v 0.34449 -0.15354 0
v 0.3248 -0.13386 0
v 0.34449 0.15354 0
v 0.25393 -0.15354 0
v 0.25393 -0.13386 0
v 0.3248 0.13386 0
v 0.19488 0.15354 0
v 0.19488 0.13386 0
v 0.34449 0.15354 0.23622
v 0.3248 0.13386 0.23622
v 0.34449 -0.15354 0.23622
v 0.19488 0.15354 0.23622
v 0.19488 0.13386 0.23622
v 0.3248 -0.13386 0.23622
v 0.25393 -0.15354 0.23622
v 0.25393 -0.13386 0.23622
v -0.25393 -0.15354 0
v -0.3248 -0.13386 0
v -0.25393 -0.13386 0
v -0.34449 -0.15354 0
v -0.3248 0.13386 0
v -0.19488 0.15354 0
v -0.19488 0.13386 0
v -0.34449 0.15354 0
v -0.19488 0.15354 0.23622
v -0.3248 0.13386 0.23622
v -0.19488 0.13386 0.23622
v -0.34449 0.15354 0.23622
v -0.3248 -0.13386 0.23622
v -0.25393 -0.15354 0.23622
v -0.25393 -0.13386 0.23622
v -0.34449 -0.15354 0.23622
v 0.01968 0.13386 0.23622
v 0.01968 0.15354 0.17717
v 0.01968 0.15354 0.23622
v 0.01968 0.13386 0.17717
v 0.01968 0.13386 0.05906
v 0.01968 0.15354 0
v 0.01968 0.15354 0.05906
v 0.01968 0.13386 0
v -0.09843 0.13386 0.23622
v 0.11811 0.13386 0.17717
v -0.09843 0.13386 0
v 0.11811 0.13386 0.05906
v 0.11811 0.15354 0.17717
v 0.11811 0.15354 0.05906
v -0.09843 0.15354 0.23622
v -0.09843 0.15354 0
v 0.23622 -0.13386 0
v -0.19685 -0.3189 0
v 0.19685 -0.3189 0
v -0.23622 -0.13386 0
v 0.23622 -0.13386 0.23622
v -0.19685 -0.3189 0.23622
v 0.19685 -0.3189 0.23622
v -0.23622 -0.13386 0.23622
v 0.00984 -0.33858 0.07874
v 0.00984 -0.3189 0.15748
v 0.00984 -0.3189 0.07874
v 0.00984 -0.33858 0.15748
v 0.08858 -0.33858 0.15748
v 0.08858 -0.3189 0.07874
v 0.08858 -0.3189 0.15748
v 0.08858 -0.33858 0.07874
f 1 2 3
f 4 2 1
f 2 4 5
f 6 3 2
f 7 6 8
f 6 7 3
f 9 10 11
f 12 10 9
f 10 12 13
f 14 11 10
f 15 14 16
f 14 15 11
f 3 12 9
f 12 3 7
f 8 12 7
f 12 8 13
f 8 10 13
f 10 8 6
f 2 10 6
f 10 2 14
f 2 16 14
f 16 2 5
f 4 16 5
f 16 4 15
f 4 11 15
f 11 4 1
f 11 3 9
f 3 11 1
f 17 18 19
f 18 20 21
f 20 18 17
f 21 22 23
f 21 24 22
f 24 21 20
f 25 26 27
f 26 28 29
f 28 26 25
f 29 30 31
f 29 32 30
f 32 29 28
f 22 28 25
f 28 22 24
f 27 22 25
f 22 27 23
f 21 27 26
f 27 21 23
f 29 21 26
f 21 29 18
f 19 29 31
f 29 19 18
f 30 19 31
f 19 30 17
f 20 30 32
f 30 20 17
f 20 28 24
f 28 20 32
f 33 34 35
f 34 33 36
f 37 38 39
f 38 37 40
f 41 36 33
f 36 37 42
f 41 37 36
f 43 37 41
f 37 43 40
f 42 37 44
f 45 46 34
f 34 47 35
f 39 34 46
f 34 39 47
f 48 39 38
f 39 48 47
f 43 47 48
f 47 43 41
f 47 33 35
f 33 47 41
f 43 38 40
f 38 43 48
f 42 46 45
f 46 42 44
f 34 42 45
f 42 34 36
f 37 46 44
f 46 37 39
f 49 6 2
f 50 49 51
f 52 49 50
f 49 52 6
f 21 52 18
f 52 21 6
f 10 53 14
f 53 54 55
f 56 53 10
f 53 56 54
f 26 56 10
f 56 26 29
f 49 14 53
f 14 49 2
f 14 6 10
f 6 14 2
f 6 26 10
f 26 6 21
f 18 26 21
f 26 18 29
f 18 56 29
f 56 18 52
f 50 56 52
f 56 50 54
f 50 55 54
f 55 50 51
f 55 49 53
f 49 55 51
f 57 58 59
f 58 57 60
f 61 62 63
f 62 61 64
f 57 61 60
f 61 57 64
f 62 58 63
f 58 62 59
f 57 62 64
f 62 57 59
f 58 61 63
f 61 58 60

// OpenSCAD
// file: defines.scad
Wb = 1.65;
Hb = 0.68;
H =  1.15;
Wf = 1.20;
Fo = 0.10;

scale = 1/2.54;
// file: LED_LTST-S270TBKT-emitter.scad
include <defines.scad>

Eh = 0.05;

// Label
scale(scale) color("Blue") translate([0, Hb/2 - H - Eh/2, 0.6/2]) rotate([90,0,0]){

  translate([1.65/2 - 0.70, 0, 0]) cube([0.2, 0.2, Eh], center=true);
}
// file: LED_LTST-S270TBKT-label.scad
include <defines.scad>

Lh = 0.05;

// Label
scale(scale) color("Green") translate([0, Hb/2 + Lh/2, 0.6/2]) rotate([90,0,0]){

  translate([-0.1, 0, 0]) cube([0.3, 0.6, Lh], center=true);
  translate([ 0.1, 0, 0]) cube([0.4, 0.3, Lh], center=true);
}
// file: LED_LTST-S270TBKT-body.scad
include <defines.scad>


scale(scale) color([0.8, 0.8, 0.8]) {

  linear_extrude(height = 0.60, center = false)
    polygon([
      [-Wb/2,  Hb/2],
      [ Wb/2,  Hb/2],
      [ Wb/2, -Hb/2],
      [ Wf/2, -Hb/2],
      [ Wf/2-Fo, Hb/2-H],
      [-Wf/2+Fo, Hb/2-H],
      [-Wf/2, -Hb/2],
      [-Wb/2, -Hb/2]
    ]);


  /*translate([-1.65/2, -0.68/2, 0]) cube([1.65, 0.68, 0.60], center=false);
  translate([-1.20/2, -1.15+0.68/2, 0]) cube([1.20, 1.15, 0.60], center=false);*/

}
// file: LED_LTST-S270TBKT-pins.scad
include <defines.scad>

module Pin()
{
  linear_extrude(height = 0.60, center = false)
    polygon([
      [ Wb/2 - 0.33,  Hb/2],
      [ Wb/2 - 0.33,  Hb/2 + Ph],
      [ Wb/2 + Ph,  Hb/2 + Ph],
      [ Wb/2 + Ph, -Hb/2 - Ph],
      [ Wb/2 - 0.18, -Hb/2 - Ph],
      [ Wb/2 - 0.18, -Hb/2],
      [ Wb/2, -Hb/2],
      [ Wb/2,  Hb/2]
    ]);
}

Ph = 0.05;


scale(scale) color("Gold") {
  Pin();
  mirror([1, 0, 0]) Pin();

}
// main file
include <LED_LTST-S270TBKT-pins.scad>
include <LED_LTST-S270TBKT-body.scad>
include <LED_LTST-S270TBKT-label.scad>
include <LED_LTST-S270TBKT-emitter.scad>
